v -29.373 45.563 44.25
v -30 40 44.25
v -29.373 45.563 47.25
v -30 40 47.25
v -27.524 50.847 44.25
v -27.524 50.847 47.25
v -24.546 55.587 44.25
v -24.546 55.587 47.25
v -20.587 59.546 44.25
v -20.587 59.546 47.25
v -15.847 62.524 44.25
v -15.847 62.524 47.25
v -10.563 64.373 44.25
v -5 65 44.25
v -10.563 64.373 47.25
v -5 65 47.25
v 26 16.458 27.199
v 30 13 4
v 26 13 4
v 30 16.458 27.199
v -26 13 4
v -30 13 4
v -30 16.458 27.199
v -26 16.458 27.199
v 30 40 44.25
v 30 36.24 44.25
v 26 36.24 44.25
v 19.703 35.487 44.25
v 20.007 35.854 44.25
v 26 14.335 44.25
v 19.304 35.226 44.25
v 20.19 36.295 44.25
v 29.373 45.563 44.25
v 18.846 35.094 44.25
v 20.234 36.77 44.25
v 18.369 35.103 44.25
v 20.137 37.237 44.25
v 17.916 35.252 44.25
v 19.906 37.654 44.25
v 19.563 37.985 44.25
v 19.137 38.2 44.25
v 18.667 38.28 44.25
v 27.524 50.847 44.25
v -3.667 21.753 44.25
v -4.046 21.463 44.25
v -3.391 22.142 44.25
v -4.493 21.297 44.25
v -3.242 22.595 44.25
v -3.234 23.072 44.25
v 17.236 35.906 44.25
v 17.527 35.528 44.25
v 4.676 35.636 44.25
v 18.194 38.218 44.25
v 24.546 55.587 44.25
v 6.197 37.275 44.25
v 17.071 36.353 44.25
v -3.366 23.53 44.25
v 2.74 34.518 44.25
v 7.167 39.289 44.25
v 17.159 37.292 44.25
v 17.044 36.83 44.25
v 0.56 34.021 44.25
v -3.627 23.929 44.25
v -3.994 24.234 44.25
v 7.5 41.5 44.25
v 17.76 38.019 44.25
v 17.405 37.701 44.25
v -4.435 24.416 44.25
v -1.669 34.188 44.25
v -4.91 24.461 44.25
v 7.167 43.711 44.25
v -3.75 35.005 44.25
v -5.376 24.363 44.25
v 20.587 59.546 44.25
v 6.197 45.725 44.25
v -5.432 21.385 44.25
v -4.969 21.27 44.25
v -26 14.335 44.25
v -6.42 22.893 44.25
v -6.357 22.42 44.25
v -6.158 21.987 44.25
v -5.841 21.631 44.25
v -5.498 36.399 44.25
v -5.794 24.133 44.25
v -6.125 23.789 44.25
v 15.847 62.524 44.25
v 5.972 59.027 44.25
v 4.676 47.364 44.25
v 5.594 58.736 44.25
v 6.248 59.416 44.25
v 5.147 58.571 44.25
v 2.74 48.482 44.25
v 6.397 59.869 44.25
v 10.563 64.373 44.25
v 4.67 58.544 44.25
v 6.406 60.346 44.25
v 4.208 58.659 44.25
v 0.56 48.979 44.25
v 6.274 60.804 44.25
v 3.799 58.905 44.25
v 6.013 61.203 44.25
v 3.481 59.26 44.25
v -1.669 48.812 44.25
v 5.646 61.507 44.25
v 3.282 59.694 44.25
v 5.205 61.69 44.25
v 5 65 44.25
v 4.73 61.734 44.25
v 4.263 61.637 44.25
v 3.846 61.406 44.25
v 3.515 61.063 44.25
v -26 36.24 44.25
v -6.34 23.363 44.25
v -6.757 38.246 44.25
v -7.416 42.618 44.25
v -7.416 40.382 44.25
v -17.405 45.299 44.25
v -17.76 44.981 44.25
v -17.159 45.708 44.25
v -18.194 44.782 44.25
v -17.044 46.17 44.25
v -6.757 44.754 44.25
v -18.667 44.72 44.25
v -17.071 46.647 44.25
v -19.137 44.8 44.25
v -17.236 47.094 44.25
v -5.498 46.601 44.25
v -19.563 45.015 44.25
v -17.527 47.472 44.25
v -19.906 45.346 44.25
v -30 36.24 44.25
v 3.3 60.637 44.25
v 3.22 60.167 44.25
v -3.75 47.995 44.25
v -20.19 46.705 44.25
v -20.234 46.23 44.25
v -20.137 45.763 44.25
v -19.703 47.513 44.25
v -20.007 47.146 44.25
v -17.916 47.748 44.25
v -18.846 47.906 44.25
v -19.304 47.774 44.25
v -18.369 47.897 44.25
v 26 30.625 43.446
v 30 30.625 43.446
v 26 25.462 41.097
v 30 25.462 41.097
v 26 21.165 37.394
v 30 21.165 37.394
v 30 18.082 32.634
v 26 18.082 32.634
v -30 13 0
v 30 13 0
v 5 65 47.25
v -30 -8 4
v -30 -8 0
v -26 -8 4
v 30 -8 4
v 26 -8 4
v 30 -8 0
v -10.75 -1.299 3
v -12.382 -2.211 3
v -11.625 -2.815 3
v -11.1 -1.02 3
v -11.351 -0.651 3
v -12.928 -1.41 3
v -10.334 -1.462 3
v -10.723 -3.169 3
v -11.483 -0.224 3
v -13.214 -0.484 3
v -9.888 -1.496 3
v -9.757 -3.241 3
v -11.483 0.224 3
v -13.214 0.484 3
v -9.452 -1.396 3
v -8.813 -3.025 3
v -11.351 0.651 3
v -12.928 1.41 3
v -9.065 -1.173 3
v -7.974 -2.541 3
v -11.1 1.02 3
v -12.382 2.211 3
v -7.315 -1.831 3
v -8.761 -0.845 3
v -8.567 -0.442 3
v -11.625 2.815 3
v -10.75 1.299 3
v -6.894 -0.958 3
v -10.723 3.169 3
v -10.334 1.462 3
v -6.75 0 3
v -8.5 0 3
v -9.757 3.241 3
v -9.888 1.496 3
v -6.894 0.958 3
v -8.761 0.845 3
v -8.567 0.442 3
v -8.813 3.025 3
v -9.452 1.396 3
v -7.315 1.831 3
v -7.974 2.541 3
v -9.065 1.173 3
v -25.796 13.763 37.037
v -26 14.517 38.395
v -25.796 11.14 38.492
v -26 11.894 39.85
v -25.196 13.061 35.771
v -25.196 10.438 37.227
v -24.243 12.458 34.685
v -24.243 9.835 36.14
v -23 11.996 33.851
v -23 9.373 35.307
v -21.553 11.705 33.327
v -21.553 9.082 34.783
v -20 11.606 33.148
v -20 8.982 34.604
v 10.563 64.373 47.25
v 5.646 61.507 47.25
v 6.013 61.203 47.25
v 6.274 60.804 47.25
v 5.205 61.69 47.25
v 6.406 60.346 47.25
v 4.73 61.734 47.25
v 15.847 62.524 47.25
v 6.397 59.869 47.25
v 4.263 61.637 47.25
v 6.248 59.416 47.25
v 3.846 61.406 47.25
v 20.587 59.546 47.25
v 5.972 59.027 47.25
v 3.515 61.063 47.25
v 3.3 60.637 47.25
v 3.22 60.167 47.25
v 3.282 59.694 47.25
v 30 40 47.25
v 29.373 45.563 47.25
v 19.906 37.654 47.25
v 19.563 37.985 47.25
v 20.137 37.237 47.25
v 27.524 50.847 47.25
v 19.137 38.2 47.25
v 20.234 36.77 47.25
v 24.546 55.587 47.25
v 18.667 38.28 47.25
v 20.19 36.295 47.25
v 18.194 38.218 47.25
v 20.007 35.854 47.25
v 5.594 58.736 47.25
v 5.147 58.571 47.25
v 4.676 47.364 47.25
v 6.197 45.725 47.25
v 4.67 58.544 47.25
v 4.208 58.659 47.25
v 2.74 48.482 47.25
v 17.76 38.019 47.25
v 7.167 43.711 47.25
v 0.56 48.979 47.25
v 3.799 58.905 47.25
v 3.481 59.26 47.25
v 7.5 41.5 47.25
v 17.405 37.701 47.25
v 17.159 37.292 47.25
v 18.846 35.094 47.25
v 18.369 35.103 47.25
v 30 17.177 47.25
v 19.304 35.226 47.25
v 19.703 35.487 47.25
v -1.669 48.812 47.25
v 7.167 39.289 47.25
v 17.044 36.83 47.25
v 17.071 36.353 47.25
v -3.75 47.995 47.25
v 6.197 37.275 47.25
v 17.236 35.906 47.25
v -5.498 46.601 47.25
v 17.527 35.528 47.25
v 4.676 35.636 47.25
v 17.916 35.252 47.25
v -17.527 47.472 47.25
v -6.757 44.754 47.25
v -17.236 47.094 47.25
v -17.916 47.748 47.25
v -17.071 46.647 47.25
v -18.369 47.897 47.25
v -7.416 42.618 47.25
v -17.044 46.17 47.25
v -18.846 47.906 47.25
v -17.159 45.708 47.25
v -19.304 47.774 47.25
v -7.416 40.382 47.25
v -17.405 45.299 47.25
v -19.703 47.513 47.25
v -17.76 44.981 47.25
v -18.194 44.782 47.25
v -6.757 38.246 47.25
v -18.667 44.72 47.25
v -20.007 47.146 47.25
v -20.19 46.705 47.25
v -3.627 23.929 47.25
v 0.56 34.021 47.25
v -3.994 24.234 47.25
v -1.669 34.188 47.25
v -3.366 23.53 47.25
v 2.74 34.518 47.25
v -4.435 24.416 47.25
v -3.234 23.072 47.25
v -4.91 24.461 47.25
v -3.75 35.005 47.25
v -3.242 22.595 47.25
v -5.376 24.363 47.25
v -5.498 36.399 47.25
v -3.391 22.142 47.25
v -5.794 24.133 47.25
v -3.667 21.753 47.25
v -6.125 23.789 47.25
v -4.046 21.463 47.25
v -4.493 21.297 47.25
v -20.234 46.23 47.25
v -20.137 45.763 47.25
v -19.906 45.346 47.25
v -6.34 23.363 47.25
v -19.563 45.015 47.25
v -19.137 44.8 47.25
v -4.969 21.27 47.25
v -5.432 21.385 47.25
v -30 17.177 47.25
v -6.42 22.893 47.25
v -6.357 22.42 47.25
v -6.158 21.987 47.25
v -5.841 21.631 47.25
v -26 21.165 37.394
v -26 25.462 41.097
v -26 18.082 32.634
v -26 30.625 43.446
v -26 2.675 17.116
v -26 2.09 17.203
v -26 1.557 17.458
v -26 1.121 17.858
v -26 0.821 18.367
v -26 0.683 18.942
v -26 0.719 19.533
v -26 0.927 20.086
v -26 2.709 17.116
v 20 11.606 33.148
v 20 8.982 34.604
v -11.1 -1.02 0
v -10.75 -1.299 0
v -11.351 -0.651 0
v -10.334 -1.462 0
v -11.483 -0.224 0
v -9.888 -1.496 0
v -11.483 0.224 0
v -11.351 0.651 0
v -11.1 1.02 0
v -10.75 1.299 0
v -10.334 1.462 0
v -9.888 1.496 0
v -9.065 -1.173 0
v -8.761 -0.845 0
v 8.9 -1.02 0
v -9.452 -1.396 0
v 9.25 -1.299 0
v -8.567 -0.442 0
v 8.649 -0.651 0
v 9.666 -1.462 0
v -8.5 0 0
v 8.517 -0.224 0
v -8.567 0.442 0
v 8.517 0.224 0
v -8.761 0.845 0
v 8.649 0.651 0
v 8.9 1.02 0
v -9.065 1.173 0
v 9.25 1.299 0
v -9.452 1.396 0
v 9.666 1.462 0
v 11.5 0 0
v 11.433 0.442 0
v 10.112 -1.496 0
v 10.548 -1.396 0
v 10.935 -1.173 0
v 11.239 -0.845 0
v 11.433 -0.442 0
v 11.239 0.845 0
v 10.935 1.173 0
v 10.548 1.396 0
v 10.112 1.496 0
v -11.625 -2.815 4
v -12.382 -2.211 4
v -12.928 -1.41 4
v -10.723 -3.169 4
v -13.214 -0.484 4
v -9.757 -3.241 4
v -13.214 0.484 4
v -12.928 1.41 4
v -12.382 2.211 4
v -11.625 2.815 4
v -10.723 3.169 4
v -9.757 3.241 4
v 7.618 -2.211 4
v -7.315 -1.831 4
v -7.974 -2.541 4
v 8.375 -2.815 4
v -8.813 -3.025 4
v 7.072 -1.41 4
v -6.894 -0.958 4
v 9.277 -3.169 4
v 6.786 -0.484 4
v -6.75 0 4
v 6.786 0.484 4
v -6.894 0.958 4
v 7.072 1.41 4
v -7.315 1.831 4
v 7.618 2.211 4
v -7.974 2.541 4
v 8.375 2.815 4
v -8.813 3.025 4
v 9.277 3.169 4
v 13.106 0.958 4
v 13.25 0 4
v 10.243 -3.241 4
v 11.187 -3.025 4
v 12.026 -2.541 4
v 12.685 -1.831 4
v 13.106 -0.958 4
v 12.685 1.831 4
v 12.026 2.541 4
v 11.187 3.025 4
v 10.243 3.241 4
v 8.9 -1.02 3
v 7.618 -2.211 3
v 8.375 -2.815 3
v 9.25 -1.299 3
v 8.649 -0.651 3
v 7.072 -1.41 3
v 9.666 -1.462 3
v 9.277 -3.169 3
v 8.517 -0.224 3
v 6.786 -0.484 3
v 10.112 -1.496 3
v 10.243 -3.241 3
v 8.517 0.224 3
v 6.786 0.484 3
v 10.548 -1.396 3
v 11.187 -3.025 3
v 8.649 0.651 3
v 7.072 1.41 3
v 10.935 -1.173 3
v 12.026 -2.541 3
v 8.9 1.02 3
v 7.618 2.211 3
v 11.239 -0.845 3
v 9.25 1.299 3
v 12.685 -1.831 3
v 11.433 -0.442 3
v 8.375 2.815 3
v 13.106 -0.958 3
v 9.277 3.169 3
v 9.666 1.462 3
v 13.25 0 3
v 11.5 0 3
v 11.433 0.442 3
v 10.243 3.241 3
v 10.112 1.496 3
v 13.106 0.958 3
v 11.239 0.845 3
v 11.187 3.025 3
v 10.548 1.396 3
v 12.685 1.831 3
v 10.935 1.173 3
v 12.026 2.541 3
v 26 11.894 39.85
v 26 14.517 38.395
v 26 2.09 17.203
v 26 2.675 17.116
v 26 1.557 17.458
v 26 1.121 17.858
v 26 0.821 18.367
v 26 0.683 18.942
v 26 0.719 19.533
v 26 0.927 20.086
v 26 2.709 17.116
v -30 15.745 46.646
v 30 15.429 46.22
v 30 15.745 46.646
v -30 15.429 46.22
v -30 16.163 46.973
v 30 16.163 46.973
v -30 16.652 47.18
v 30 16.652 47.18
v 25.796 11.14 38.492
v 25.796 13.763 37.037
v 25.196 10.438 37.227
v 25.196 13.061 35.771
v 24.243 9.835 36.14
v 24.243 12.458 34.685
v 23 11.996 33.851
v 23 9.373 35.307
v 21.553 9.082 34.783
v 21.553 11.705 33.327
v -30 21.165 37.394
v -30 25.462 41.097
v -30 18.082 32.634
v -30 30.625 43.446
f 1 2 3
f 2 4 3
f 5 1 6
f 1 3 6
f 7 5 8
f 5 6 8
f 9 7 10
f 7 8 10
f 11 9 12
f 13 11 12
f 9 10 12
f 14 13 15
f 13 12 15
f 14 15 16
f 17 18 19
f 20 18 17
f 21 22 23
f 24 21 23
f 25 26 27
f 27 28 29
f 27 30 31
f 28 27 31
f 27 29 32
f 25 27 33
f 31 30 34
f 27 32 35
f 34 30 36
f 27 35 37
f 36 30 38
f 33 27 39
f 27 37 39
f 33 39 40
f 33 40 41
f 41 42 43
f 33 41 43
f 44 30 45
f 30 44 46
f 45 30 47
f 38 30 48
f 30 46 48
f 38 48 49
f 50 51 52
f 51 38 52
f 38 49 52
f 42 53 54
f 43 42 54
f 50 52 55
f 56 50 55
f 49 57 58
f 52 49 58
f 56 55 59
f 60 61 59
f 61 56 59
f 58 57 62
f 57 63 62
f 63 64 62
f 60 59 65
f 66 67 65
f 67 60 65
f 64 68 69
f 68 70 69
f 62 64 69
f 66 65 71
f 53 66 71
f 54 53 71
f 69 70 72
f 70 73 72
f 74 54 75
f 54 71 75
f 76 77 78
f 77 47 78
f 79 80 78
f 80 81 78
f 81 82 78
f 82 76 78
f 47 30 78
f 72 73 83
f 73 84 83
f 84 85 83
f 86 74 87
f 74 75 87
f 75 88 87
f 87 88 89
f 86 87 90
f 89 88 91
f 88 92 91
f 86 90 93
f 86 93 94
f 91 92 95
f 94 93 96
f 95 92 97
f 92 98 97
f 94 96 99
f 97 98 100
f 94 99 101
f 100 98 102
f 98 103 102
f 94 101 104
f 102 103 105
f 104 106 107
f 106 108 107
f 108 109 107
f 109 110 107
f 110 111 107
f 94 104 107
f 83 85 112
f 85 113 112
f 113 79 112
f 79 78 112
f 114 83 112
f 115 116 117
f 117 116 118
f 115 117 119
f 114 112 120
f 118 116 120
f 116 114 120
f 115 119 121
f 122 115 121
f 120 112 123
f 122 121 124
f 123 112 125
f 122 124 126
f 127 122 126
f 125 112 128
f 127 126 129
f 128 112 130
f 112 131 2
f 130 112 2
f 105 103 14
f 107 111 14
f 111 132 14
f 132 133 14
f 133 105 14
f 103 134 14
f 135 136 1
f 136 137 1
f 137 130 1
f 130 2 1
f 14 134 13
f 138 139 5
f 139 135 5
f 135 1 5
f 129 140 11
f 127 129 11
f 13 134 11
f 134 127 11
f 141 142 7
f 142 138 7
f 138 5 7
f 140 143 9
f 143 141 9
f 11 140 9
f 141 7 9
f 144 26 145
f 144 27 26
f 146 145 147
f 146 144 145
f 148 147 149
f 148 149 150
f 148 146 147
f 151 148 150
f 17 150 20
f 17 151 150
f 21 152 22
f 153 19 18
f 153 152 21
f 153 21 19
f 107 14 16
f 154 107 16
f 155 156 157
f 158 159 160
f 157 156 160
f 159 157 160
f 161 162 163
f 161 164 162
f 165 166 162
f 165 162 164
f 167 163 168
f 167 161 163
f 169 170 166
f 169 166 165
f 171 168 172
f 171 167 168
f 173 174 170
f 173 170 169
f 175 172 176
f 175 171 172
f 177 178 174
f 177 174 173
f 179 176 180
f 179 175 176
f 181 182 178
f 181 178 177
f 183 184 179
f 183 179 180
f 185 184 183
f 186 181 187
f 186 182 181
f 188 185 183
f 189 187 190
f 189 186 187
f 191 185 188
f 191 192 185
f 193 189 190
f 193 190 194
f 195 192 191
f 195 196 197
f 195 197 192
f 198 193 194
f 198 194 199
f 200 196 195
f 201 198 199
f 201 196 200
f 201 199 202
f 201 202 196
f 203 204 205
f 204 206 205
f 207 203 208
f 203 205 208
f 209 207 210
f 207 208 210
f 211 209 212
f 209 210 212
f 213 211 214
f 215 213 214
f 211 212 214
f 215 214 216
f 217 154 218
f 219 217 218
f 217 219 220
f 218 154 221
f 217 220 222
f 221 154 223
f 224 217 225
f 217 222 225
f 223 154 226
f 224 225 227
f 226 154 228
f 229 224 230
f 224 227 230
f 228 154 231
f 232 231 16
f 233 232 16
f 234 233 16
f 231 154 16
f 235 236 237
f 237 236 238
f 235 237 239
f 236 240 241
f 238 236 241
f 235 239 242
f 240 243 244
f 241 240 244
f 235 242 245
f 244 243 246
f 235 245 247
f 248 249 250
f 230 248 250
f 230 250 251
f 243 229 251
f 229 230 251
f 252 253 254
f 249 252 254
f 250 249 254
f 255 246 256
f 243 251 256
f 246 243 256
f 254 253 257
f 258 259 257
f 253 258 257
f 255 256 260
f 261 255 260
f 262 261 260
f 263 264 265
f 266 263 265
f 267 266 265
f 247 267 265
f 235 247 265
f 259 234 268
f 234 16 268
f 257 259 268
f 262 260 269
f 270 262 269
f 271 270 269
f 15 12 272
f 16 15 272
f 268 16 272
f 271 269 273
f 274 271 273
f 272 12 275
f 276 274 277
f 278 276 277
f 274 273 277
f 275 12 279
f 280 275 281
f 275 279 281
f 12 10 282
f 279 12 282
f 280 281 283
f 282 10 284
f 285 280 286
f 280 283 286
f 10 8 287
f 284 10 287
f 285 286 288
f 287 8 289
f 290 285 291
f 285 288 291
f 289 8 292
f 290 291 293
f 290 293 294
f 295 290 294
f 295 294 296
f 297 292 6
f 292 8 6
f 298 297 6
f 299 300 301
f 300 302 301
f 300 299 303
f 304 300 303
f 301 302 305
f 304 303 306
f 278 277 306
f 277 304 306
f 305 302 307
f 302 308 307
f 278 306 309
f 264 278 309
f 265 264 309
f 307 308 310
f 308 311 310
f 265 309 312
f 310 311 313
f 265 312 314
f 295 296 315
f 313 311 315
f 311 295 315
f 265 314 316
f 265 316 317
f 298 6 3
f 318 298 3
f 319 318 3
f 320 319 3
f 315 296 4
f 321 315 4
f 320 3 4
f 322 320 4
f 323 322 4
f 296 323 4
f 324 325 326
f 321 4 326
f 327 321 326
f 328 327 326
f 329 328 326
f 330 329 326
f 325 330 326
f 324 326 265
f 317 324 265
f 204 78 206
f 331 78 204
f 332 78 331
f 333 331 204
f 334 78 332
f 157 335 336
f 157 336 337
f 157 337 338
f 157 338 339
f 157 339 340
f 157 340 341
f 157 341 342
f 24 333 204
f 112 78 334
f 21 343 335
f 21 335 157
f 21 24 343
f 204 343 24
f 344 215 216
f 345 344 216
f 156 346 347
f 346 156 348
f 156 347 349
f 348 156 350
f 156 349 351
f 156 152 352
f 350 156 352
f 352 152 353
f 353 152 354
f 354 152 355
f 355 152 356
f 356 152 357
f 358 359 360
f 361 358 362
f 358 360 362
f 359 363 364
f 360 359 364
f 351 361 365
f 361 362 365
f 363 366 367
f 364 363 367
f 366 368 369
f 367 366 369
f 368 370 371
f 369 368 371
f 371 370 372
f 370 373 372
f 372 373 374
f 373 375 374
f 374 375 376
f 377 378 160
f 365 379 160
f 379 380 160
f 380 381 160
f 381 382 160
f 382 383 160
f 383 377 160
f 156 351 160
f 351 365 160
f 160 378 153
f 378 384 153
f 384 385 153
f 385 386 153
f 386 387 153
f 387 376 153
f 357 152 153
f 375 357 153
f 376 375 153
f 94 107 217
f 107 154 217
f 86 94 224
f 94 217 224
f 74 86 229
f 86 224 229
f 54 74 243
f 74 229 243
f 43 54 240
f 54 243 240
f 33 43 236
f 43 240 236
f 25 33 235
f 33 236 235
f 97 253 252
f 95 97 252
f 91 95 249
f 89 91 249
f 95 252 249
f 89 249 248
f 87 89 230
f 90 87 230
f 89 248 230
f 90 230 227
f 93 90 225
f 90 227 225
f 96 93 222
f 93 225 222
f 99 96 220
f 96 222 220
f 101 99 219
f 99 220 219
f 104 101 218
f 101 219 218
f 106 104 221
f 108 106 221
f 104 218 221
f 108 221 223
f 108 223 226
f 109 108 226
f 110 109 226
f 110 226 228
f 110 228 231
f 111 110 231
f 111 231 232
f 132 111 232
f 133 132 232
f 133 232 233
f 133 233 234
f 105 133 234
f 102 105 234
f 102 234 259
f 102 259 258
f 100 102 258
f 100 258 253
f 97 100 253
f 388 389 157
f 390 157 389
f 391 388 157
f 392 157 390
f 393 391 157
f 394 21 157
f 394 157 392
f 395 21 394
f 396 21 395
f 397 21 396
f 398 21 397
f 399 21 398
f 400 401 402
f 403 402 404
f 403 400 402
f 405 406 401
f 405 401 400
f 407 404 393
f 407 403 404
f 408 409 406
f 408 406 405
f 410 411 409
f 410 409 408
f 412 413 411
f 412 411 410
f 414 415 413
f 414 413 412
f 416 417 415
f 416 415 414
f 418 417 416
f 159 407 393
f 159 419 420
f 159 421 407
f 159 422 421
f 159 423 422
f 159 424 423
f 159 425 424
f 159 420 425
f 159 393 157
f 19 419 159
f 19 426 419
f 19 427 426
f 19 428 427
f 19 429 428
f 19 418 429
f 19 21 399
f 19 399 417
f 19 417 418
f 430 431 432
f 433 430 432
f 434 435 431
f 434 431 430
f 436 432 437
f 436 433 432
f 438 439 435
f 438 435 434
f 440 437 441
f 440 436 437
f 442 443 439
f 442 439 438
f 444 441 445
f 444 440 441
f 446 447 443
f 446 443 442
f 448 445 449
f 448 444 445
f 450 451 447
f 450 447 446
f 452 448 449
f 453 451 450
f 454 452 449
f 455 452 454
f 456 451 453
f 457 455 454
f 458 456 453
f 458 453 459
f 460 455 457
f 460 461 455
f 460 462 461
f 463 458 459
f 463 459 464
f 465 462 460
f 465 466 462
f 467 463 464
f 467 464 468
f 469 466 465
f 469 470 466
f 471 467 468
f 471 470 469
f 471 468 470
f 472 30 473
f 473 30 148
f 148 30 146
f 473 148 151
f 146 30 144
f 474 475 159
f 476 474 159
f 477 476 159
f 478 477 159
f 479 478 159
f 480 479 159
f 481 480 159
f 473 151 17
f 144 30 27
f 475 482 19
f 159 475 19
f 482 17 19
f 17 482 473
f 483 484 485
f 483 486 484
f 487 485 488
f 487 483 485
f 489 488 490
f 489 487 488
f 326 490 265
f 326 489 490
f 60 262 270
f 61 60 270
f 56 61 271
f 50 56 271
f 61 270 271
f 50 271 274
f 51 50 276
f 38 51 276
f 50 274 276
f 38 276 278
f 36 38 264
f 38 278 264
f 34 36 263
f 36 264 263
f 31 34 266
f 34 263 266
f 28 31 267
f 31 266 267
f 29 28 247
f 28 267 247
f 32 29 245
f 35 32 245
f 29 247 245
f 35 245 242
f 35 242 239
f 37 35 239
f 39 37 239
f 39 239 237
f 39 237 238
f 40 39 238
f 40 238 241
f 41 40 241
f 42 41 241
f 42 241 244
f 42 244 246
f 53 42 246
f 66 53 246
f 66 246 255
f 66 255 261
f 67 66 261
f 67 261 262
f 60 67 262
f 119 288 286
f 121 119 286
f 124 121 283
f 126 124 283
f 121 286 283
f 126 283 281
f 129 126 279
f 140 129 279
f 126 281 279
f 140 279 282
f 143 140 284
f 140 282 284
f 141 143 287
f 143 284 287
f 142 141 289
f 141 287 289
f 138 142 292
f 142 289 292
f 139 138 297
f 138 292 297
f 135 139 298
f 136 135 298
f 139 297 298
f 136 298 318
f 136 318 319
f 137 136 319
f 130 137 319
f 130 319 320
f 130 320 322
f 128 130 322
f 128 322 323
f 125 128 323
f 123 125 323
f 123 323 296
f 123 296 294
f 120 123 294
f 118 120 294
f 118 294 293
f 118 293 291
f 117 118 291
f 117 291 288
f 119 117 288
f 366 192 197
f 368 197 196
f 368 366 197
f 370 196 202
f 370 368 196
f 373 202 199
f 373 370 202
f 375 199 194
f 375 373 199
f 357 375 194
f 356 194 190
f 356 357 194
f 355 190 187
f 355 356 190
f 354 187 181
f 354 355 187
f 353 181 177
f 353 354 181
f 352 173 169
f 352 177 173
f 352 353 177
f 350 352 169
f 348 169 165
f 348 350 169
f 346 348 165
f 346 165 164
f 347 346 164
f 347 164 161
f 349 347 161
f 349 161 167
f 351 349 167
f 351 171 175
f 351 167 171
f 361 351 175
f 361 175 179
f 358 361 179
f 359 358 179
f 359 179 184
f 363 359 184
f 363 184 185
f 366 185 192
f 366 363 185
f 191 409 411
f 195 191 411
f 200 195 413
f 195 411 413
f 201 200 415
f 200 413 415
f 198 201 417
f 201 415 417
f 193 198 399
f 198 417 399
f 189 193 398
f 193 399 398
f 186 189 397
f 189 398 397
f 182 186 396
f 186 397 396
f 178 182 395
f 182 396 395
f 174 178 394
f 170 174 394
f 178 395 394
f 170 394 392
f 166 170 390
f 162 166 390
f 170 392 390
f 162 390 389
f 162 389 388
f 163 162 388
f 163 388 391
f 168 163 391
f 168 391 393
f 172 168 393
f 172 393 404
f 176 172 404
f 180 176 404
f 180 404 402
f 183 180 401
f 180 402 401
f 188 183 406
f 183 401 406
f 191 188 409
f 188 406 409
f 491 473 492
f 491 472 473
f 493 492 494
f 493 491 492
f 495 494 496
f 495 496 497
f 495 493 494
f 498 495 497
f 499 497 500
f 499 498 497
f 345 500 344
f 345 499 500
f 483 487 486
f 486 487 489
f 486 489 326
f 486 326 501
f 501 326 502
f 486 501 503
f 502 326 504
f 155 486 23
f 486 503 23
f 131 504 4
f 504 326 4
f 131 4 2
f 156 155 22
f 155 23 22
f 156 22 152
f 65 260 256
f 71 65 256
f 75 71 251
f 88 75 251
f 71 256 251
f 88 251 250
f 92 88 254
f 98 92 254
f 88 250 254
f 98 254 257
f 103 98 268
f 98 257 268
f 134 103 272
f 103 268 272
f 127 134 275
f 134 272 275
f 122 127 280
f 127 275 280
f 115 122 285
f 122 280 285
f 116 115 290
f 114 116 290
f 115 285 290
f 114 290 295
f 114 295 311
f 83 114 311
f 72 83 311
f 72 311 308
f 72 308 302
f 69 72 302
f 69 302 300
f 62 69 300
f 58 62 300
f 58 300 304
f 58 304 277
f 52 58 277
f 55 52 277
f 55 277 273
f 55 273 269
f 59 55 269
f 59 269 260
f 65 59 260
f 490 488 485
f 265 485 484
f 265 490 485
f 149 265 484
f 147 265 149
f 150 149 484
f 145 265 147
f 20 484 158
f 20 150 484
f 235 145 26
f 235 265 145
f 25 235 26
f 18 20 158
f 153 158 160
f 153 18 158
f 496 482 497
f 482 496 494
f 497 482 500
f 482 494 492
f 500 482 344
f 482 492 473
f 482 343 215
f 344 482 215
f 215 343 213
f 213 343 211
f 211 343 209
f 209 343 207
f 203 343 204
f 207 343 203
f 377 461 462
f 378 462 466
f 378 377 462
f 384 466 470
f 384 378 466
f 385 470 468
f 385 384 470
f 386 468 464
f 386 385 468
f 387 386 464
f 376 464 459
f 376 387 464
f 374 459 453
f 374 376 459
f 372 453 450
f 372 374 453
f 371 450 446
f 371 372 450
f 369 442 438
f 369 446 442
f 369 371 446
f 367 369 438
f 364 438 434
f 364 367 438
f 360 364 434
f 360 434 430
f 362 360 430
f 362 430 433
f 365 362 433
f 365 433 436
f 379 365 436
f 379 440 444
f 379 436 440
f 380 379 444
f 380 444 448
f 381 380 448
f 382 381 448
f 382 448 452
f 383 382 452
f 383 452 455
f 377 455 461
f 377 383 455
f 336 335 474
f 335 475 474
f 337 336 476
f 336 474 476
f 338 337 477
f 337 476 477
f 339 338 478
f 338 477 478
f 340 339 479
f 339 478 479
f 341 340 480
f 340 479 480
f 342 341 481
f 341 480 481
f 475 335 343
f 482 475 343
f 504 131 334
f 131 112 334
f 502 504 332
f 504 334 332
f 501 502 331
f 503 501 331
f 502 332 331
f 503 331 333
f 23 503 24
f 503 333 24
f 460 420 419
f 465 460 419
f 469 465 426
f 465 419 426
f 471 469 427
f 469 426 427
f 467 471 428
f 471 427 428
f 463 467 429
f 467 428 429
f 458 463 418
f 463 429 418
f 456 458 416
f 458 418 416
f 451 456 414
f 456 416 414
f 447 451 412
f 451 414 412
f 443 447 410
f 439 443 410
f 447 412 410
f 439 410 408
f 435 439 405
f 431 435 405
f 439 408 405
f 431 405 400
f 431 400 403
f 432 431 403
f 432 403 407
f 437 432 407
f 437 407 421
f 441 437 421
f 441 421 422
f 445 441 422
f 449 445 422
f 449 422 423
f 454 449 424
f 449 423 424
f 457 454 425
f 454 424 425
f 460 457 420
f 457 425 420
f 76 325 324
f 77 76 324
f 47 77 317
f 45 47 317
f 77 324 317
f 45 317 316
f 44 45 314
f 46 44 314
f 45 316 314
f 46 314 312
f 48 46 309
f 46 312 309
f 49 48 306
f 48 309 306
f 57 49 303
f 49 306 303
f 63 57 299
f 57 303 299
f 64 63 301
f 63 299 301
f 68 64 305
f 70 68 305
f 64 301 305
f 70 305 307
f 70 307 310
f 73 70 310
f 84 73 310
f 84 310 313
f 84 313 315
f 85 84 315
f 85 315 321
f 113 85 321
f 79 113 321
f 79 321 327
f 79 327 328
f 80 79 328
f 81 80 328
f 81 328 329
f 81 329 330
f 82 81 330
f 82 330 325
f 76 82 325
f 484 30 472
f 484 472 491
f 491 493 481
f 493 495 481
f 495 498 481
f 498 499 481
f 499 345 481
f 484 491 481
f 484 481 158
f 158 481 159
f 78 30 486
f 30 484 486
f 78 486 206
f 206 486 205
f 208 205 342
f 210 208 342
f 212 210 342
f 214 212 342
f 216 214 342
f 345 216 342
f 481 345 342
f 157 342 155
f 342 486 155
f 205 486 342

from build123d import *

# Parameters (mm, degrees)
SKETCH_1_R          = 1.4999999999999987
EXTRUDE_1_DEPTH     = 4
SKETCH_3_R          = 3.2499999999999996
SKETCH_3_R_2        = 3.249999999999999
CUT_EXTRUDE_1_DEPTH = 1
EXTRUDE_2_DEPTH     = 4
EXTRUDE_3_DEPTH     = 4
EXTRUDE_4_DEPTH     = 52
FILLET_1_R          = 25
FILLET_2_R          = 20
EXTRUDE_6_DEPTH     = 52
FILLET_4_R          = 6
FILLET_5_R          = 2
SKETCH_11_R         = 7.500000000000031
CUT_EXTRUDE_2_DEPTH = 4
FILLET_6_R          = 2


with BuildPart() as part:
    # 草图1 → 凸台-拉伸1 (new body)
    # profile 1 of 3: a face of its own
    with BuildSketch(Plane.XY):
        Polygon((30.00000000000006, 4.99999999999999), (30.000000000000057, -5.0000000000000115), (-29.99999999999994, -5.0000000000000115), (-29.999999999999936, 4.99999999999999), align=None)
        with Locations((9.999999999999996, 5.68e-15)):
            Circle(SKETCH_1_R, mode=Mode.SUBTRACT)
        with Locations((-10.000000000000004, -4.4e-16)):
            Circle(SKETCH_1_R, mode=Mode.SUBTRACT)
    # profile 2 of 3: a face of its own
    with BuildSketch(Plane.XY):
        Polygon((-30.000000000000014, 12.999999999999998), (29.999999999999986, 12.999999999999998), (30.00000000000006, 4.99999999999999), (-29.999999999999936, 4.99999999999999), align=None)
    # profile 3 of 3: a face of its own
    with BuildSketch(Plane.XY):
        Polygon((-29.99999999999994, -5.0000000000000115), (-30.000000000000018, -8.000000000000002), (29.999999999999982, -8.000000000000002), (30.000000000000057, -5.0000000000000115), align=None)
    extrude(amount=EXTRUDE_1_DEPTH)

    # 草图3 → 切除-拉伸1 (cut)
    with BuildSketch(Plane.XY.offset(4)):
        with Locations((-10.000000000000004, -4.6e-16)):
            Circle(SKETCH_3_R)
        with Locations((9.999999999999996, 5.69e-15)):
            Circle(SKETCH_3_R_2)
    extrude(amount=-CUT_EXTRUDE_1_DEPTH, mode=Mode.SUBTRACT)

    # 草图5 → 凸台-拉伸2 (add)
    with BuildSketch(Plane.ZY.offset(29.999999999999936)):
        Polygon((47.25000000000001, 15.99999999999999), (4, -8.000000000000012), (4, 12.999999999999988), (44.25, 18.99999999999999), (44.25, 64.99999999999999), (47.25, 64.99999999999999), align=None)
    extrude(amount=-EXTRUDE_2_DEPTH)

    # 草图6 → 凸台-拉伸3 (add)
    with BuildSketch(Plane(origin=(30.00000000000006, -1.041e-14, 0), x_dir=(0, 0, -1), z_dir=(1, -3.5e-16, 0))):
        Polygon((-44.25, 64.99999999999999), (-47.25, 64.99999999999999), (-47.25000000000001, 15.99999999999999), (-4, -8.00000000000001), (-4, 13.000000000000009), (-44.25, 18.999999999999993), align=None)
    extrude(amount=-EXTRUDE_3_DEPTH)

    # 草图7 → 凸台-拉伸4 (add)
    with BuildSketch(Plane(origin=(-25.999999999999932, 8.47e-15, 0), x_dir=(0, 0, -1), z_dir=(1, -3.3e-16, 0))):
        Polygon((-44.25, 14.335260115606923), (-44.25, 18.999999999999993), (-44.25, 64.99999999999999), (-47.25, 64.99999999999999), (-47.25000000000001, 15.999999999999986), align=None)
    extrude(amount=EXTRUDE_4_DEPTH)

    # 圆角1
    fillet_1_edges = [part.edges().sort_by_distance(p)[0] for p in [
        (-29.999999999999915, 65, 45.75),
        (30.00000000000008, 64.99999999999997, 45.75),
    ]]
    fillet(fillet_1_edges, radius=FILLET_1_R)

    # 圆角2
    fillet_2_edges = [part.edges().sort_by_distance(p)[0] for p in [
        (-27.99999999999993, 19, 44.25),
        (28.000000000000068, 18.999999999999982, 44.25),
    ]]
    fillet(fillet_2_edges, radius=FILLET_2_R)

    # 草图9 → 凸台-拉伸6 (add)
    with BuildSketch(Plane(origin=(-25.999999999999932, 8.47e-15, 0), x_dir=(0, 0, -1), z_dir=(1, -3.3e-16, 0))):
        Polygon((-33.14820415728187, 11.605667405253392), (-34.60384535674384, 8.982480660389633), (-17.11593372431879, -0.7217940026901655), (-17.115933724318786, 2.7091473962102923), align=None)
    extrude(amount=EXTRUDE_6_DEPTH)

    # 圆角4
    fillet_4_edges = [part.edges().sort_by_distance(p)[0] for p in [
        (-25.99999999999993, 10.294074032821522, 33.87602475701286),
        (26.00000000000007, 10.294074032821504, 33.87602475701286),
    ]]
    fillet(fillet_4_edges, radius=FILLET_4_R)

    # 圆角5
    fillet_5_edges = [part.edges().sort_by_distance(p)[0] for p in [
        (6.75e-14, -0.721794002690165, 17.11593372431879),
    ]]
    fillet(fillet_5_edges, radius=FILLET_5_R)

    # 草图11 → 切除-拉伸2 (cut)
    with BuildSketch(Plane.XY.offset(47.25000000000001)):
        with BuildLine():
            ThreePointArc((-20.11504932930021, 46.93210856983418), (-19.24913556906646, 44.8416078260319), (-17.158634825264187, 45.70752158626565))
            ThreePointArc((-17.158634825264187, 45.70752158626565), (-18.024548585497932, 47.79802233006792), (-20.11504932930021, 46.93210856983418))
        make_face()
        with BuildLine():
            ThreePointArc((-4.207521586267032, 24.341365174733916), (-6.298022330069304, 23.475451414500167), (-5.432108569835557, 21.384950670697894))
            ThreePointArc((-5.432108569835557, 21.384950670697894), (-3.341607826033282, 22.250864430931642), (-4.207521586267032, 24.341365174733916))
        make_face()
        with BuildLine():
            ThreePointArc((20.11504932930082, 36.06789143016255), (19.24913556906707, 38.158392173964835), (17.158634825264798, 37.292478413731075))
            ThreePointArc((17.158634825264798, 37.292478413731075), (18.024548585498543, 35.20197766992881), (20.11504932930082, 36.06789143016255))
        make_face()
        with BuildLine():
            ThreePointArc((5.43210856983612, 61.61504932929888), (3.341607826033848, 60.74913556906513), (4.207521586267595, 58.65863482526286))
            ThreePointArc((4.207521586267595, 58.65863482526286), (6.298022330069867, 59.5245485854966), (5.43210856983612, 61.61504932929888))
        make_face()
        with Locations((2.6021e-13, 41.49999999999841)):
            Circle(SKETCH_11_R)
    extrude(amount=-CUT_EXTRUDE_2_DEPTH, mode=Mode.SUBTRACT)

    # 圆角6
    fillet_6_edges = [part.edges().sort_by_distance(p)[0] for p in [
        (7.105e-14, 15.99999999999999, 47.25000000000001),
    ]]
    fillet(fillet_6_edges, radius=FILLET_6_R)


solid = part.part
